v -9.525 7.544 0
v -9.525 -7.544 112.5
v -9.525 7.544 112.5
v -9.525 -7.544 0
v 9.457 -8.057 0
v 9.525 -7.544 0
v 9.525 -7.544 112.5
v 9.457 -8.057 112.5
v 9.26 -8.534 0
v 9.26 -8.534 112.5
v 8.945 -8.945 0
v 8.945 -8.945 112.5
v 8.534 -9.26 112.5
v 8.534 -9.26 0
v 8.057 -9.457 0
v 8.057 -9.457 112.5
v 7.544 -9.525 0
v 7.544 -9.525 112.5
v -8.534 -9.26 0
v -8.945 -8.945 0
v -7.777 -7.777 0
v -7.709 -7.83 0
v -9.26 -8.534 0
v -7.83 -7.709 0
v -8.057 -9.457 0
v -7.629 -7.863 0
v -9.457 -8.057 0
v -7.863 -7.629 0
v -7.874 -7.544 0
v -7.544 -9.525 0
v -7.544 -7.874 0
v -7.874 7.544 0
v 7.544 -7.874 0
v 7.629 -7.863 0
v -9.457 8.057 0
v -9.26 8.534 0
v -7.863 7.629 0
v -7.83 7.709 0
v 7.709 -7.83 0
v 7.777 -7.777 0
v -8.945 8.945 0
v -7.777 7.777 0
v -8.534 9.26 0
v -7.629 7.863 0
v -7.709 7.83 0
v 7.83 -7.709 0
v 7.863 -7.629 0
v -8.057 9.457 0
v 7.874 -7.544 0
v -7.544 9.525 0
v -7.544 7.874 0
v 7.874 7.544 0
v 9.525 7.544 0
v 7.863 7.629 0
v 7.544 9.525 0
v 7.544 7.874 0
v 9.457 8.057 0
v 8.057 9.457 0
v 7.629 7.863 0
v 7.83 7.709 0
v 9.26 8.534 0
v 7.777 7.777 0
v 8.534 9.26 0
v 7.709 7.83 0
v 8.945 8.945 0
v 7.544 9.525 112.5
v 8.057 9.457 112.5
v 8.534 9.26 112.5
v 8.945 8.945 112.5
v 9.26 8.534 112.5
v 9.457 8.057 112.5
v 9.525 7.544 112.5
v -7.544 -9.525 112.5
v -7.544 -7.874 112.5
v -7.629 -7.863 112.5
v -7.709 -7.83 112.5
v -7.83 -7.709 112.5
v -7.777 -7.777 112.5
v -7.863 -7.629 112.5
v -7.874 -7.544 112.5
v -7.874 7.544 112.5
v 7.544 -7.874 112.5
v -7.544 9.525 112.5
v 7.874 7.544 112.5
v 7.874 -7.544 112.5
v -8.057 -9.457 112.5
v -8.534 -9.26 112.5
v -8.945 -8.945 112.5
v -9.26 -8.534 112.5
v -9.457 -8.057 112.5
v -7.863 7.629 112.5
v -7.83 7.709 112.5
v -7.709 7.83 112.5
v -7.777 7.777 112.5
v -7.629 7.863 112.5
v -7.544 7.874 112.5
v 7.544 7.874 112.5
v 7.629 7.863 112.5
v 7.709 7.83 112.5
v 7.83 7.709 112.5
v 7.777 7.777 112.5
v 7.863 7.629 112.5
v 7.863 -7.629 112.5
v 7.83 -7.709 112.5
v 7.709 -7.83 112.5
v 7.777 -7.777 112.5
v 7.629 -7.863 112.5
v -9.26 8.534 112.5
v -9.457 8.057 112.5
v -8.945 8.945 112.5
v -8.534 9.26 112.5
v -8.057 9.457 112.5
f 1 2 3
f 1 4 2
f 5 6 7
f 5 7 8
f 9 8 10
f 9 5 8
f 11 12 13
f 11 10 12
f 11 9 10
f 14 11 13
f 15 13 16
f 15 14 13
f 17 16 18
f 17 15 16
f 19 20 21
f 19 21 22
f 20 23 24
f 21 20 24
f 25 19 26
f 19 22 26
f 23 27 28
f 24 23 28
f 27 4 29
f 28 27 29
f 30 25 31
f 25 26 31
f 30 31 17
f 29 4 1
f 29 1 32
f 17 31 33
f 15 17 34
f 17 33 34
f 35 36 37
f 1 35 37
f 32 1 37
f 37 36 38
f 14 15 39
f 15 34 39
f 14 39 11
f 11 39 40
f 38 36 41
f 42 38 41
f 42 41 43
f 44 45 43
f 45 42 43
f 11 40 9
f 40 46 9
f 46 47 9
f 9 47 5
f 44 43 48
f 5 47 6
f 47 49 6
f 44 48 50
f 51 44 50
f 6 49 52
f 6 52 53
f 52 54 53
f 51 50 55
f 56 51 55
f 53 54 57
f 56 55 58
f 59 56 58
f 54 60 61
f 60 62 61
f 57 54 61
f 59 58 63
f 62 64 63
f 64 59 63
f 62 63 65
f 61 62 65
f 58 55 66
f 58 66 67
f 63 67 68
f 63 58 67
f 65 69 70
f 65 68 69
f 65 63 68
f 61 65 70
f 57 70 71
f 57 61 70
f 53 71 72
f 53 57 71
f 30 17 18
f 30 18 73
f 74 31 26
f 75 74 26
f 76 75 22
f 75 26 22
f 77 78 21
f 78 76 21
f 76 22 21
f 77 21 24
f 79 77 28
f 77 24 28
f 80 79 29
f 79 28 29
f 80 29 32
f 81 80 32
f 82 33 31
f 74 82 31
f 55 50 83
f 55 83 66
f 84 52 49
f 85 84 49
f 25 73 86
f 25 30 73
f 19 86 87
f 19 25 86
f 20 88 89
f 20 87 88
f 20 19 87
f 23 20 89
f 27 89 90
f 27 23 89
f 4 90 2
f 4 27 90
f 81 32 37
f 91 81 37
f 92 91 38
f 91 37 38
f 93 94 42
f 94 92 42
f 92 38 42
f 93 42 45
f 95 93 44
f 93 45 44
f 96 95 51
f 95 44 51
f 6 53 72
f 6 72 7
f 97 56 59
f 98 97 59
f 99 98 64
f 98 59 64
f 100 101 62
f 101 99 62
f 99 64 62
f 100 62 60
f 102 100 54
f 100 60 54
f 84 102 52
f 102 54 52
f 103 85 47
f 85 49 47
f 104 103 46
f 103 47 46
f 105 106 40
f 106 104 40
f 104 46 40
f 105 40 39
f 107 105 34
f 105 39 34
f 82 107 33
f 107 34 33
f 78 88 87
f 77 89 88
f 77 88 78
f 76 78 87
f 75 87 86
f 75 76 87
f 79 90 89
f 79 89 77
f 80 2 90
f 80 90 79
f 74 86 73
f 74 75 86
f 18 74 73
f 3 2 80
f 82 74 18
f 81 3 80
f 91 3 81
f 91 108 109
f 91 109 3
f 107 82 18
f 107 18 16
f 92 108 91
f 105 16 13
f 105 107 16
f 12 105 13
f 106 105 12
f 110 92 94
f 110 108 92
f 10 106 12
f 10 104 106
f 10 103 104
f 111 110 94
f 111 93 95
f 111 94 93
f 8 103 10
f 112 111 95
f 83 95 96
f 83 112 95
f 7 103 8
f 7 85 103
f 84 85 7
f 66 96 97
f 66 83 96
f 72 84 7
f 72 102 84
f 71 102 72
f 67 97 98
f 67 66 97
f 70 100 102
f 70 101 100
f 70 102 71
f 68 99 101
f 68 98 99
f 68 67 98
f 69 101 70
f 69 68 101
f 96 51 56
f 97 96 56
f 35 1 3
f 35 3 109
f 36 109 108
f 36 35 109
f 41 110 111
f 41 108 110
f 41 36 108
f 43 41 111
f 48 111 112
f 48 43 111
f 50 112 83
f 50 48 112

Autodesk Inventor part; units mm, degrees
ref_plane "YZ Plane" through (0, 0, 0) normal (1, 0, 0) x (0, 1, 0)
ref_plane "Start plane" through (0, 0, 0) normal (0, 0, 1) x (1, 0, 0)
ref_plane "End plane" through (0, 0, 112.5) normal (0, 0, 1) x (1, 0, 0)
sketch "Sketch" plane through (0, 0, 0) normal (0, 0, 1) x (1, 0, 0)
  line L0 (-9.525, -7.5438) -> (-9.525, 7.5438)
  line L1 (-7.5438, 9.525) -> (7.5438, 9.525)
  line L2 (9.525, 7.5438) -> (9.525, -7.5438)
  line L3 (7.5438, -9.525) -> (-7.5438, -9.525)
  arc A0 (-9.525, -7.5438) -> (-7.5438, -9.525) centre (-7.5438, -7.5438) ccw
  arc A1 (-7.5438, 9.525) -> (-9.525, 7.5438) centre (-7.5438, 7.5438) ccw
  arc A2 (9.525, 7.5438) -> (7.5438, 9.525) centre (7.5438, 7.5438) ccw
  arc A3 (7.5438, -9.525) -> (9.525, -7.5438) centre (7.5438, -7.5438) ccw
  arc A4 (-7.5438, 7.874) -> (-7.874, 7.5438) centre (-7.5438, 7.5438) ccw
  line L4 (-7.5438, 7.874) -> (7.5438, 7.874)
  arc A5 (7.874, 7.5438) -> (7.5438, 7.874) centre (7.5438, 7.5438) ccw
  line L5 (7.874, 7.5438) -> (7.874, -7.5438)
  arc A6 (7.5438, -7.874) -> (7.874, -7.5438) centre (7.5438, -7.5438) ccw
  line L6 (7.5438, -7.874) -> (-7.5438, -7.874)
  arc A7 (-7.874, -7.5438) -> (-7.5438, -7.874) centre (-7.5438, -7.5438) ccw
  line L7 (-7.874, -7.5438) -> (-7.874, 7.5438)
  line L8 (0, 13.9094) -> (0, -13.9094) construction
  line L9 (-13.9224, 0) -> (13.9871, 0) construction
  dimension "d10" = 19.05
  dimension "d11" = 19.05
  dimension "d12" = 1.651
  dimension "d15" = 9.525
  dimension "d16" = 9.525
  dimension "d17" = 1.9812
extrude "Body" add sketch "Sketch" along normal up to surface (112.5 mm away) from surface at 0
sketch "Sketch3" plane through (0, 0, 0) normal (0, 0, 1) x (1, 0, 0)
  line L0 (0, 0) -> (10, 0)
ref_plane "Work Plane3" through (0, 0, 0) normal (0, -1, 0) x (1, 0, 0)
sketch "Sketch4" plane through (0, 0, 0) normal (0, -1, 0) x (1, 0, 0)
  line L0 (-2, 0) -> (12, 0)
  line L1 (-2, 112.5) -> (12, 112.5)
  dimension "d19" = 112.5
ref_plane "Work Plane4" through (0, 7.5438, 0) normal (-1, 0, 0) x (0, 0, 1)
ref_plane "Work Plane5" through (7.5438, 0, 112.5) normal (0, 1, 0) x (1, 0, 0)
equation "\"d10\" = G_H"
equation "\"d11\" = G_W"
equation "\"d12\" = G_T"
equation "\"d15\" = 0.5 * d10"
equation "\"d16\" = 0.5 * d11"
equation "\"d17\" = G_IR"
equation "\"d3\" = G_L"
equation "\"G_W\" = 19.05"
equation "\"G_H\" = 19.05"
equation "\"G_T\" = 1.651"
equation "\"G_IR\" = 1.2 * G_T"
equation "\"G_L\" = d19"
equation "\"G_OFFSET_START\" = 0"
equation "\"G_OFFSET_END\" = 0"
equation "\"d14\" = G_OFFSET_END + B_L"
equation "\"B_L\" = 112.5"
properties part number "ASTM A513 - 3/4 x 3/4 x 13/200 - 4.4291339" material "Steel, Mild"
